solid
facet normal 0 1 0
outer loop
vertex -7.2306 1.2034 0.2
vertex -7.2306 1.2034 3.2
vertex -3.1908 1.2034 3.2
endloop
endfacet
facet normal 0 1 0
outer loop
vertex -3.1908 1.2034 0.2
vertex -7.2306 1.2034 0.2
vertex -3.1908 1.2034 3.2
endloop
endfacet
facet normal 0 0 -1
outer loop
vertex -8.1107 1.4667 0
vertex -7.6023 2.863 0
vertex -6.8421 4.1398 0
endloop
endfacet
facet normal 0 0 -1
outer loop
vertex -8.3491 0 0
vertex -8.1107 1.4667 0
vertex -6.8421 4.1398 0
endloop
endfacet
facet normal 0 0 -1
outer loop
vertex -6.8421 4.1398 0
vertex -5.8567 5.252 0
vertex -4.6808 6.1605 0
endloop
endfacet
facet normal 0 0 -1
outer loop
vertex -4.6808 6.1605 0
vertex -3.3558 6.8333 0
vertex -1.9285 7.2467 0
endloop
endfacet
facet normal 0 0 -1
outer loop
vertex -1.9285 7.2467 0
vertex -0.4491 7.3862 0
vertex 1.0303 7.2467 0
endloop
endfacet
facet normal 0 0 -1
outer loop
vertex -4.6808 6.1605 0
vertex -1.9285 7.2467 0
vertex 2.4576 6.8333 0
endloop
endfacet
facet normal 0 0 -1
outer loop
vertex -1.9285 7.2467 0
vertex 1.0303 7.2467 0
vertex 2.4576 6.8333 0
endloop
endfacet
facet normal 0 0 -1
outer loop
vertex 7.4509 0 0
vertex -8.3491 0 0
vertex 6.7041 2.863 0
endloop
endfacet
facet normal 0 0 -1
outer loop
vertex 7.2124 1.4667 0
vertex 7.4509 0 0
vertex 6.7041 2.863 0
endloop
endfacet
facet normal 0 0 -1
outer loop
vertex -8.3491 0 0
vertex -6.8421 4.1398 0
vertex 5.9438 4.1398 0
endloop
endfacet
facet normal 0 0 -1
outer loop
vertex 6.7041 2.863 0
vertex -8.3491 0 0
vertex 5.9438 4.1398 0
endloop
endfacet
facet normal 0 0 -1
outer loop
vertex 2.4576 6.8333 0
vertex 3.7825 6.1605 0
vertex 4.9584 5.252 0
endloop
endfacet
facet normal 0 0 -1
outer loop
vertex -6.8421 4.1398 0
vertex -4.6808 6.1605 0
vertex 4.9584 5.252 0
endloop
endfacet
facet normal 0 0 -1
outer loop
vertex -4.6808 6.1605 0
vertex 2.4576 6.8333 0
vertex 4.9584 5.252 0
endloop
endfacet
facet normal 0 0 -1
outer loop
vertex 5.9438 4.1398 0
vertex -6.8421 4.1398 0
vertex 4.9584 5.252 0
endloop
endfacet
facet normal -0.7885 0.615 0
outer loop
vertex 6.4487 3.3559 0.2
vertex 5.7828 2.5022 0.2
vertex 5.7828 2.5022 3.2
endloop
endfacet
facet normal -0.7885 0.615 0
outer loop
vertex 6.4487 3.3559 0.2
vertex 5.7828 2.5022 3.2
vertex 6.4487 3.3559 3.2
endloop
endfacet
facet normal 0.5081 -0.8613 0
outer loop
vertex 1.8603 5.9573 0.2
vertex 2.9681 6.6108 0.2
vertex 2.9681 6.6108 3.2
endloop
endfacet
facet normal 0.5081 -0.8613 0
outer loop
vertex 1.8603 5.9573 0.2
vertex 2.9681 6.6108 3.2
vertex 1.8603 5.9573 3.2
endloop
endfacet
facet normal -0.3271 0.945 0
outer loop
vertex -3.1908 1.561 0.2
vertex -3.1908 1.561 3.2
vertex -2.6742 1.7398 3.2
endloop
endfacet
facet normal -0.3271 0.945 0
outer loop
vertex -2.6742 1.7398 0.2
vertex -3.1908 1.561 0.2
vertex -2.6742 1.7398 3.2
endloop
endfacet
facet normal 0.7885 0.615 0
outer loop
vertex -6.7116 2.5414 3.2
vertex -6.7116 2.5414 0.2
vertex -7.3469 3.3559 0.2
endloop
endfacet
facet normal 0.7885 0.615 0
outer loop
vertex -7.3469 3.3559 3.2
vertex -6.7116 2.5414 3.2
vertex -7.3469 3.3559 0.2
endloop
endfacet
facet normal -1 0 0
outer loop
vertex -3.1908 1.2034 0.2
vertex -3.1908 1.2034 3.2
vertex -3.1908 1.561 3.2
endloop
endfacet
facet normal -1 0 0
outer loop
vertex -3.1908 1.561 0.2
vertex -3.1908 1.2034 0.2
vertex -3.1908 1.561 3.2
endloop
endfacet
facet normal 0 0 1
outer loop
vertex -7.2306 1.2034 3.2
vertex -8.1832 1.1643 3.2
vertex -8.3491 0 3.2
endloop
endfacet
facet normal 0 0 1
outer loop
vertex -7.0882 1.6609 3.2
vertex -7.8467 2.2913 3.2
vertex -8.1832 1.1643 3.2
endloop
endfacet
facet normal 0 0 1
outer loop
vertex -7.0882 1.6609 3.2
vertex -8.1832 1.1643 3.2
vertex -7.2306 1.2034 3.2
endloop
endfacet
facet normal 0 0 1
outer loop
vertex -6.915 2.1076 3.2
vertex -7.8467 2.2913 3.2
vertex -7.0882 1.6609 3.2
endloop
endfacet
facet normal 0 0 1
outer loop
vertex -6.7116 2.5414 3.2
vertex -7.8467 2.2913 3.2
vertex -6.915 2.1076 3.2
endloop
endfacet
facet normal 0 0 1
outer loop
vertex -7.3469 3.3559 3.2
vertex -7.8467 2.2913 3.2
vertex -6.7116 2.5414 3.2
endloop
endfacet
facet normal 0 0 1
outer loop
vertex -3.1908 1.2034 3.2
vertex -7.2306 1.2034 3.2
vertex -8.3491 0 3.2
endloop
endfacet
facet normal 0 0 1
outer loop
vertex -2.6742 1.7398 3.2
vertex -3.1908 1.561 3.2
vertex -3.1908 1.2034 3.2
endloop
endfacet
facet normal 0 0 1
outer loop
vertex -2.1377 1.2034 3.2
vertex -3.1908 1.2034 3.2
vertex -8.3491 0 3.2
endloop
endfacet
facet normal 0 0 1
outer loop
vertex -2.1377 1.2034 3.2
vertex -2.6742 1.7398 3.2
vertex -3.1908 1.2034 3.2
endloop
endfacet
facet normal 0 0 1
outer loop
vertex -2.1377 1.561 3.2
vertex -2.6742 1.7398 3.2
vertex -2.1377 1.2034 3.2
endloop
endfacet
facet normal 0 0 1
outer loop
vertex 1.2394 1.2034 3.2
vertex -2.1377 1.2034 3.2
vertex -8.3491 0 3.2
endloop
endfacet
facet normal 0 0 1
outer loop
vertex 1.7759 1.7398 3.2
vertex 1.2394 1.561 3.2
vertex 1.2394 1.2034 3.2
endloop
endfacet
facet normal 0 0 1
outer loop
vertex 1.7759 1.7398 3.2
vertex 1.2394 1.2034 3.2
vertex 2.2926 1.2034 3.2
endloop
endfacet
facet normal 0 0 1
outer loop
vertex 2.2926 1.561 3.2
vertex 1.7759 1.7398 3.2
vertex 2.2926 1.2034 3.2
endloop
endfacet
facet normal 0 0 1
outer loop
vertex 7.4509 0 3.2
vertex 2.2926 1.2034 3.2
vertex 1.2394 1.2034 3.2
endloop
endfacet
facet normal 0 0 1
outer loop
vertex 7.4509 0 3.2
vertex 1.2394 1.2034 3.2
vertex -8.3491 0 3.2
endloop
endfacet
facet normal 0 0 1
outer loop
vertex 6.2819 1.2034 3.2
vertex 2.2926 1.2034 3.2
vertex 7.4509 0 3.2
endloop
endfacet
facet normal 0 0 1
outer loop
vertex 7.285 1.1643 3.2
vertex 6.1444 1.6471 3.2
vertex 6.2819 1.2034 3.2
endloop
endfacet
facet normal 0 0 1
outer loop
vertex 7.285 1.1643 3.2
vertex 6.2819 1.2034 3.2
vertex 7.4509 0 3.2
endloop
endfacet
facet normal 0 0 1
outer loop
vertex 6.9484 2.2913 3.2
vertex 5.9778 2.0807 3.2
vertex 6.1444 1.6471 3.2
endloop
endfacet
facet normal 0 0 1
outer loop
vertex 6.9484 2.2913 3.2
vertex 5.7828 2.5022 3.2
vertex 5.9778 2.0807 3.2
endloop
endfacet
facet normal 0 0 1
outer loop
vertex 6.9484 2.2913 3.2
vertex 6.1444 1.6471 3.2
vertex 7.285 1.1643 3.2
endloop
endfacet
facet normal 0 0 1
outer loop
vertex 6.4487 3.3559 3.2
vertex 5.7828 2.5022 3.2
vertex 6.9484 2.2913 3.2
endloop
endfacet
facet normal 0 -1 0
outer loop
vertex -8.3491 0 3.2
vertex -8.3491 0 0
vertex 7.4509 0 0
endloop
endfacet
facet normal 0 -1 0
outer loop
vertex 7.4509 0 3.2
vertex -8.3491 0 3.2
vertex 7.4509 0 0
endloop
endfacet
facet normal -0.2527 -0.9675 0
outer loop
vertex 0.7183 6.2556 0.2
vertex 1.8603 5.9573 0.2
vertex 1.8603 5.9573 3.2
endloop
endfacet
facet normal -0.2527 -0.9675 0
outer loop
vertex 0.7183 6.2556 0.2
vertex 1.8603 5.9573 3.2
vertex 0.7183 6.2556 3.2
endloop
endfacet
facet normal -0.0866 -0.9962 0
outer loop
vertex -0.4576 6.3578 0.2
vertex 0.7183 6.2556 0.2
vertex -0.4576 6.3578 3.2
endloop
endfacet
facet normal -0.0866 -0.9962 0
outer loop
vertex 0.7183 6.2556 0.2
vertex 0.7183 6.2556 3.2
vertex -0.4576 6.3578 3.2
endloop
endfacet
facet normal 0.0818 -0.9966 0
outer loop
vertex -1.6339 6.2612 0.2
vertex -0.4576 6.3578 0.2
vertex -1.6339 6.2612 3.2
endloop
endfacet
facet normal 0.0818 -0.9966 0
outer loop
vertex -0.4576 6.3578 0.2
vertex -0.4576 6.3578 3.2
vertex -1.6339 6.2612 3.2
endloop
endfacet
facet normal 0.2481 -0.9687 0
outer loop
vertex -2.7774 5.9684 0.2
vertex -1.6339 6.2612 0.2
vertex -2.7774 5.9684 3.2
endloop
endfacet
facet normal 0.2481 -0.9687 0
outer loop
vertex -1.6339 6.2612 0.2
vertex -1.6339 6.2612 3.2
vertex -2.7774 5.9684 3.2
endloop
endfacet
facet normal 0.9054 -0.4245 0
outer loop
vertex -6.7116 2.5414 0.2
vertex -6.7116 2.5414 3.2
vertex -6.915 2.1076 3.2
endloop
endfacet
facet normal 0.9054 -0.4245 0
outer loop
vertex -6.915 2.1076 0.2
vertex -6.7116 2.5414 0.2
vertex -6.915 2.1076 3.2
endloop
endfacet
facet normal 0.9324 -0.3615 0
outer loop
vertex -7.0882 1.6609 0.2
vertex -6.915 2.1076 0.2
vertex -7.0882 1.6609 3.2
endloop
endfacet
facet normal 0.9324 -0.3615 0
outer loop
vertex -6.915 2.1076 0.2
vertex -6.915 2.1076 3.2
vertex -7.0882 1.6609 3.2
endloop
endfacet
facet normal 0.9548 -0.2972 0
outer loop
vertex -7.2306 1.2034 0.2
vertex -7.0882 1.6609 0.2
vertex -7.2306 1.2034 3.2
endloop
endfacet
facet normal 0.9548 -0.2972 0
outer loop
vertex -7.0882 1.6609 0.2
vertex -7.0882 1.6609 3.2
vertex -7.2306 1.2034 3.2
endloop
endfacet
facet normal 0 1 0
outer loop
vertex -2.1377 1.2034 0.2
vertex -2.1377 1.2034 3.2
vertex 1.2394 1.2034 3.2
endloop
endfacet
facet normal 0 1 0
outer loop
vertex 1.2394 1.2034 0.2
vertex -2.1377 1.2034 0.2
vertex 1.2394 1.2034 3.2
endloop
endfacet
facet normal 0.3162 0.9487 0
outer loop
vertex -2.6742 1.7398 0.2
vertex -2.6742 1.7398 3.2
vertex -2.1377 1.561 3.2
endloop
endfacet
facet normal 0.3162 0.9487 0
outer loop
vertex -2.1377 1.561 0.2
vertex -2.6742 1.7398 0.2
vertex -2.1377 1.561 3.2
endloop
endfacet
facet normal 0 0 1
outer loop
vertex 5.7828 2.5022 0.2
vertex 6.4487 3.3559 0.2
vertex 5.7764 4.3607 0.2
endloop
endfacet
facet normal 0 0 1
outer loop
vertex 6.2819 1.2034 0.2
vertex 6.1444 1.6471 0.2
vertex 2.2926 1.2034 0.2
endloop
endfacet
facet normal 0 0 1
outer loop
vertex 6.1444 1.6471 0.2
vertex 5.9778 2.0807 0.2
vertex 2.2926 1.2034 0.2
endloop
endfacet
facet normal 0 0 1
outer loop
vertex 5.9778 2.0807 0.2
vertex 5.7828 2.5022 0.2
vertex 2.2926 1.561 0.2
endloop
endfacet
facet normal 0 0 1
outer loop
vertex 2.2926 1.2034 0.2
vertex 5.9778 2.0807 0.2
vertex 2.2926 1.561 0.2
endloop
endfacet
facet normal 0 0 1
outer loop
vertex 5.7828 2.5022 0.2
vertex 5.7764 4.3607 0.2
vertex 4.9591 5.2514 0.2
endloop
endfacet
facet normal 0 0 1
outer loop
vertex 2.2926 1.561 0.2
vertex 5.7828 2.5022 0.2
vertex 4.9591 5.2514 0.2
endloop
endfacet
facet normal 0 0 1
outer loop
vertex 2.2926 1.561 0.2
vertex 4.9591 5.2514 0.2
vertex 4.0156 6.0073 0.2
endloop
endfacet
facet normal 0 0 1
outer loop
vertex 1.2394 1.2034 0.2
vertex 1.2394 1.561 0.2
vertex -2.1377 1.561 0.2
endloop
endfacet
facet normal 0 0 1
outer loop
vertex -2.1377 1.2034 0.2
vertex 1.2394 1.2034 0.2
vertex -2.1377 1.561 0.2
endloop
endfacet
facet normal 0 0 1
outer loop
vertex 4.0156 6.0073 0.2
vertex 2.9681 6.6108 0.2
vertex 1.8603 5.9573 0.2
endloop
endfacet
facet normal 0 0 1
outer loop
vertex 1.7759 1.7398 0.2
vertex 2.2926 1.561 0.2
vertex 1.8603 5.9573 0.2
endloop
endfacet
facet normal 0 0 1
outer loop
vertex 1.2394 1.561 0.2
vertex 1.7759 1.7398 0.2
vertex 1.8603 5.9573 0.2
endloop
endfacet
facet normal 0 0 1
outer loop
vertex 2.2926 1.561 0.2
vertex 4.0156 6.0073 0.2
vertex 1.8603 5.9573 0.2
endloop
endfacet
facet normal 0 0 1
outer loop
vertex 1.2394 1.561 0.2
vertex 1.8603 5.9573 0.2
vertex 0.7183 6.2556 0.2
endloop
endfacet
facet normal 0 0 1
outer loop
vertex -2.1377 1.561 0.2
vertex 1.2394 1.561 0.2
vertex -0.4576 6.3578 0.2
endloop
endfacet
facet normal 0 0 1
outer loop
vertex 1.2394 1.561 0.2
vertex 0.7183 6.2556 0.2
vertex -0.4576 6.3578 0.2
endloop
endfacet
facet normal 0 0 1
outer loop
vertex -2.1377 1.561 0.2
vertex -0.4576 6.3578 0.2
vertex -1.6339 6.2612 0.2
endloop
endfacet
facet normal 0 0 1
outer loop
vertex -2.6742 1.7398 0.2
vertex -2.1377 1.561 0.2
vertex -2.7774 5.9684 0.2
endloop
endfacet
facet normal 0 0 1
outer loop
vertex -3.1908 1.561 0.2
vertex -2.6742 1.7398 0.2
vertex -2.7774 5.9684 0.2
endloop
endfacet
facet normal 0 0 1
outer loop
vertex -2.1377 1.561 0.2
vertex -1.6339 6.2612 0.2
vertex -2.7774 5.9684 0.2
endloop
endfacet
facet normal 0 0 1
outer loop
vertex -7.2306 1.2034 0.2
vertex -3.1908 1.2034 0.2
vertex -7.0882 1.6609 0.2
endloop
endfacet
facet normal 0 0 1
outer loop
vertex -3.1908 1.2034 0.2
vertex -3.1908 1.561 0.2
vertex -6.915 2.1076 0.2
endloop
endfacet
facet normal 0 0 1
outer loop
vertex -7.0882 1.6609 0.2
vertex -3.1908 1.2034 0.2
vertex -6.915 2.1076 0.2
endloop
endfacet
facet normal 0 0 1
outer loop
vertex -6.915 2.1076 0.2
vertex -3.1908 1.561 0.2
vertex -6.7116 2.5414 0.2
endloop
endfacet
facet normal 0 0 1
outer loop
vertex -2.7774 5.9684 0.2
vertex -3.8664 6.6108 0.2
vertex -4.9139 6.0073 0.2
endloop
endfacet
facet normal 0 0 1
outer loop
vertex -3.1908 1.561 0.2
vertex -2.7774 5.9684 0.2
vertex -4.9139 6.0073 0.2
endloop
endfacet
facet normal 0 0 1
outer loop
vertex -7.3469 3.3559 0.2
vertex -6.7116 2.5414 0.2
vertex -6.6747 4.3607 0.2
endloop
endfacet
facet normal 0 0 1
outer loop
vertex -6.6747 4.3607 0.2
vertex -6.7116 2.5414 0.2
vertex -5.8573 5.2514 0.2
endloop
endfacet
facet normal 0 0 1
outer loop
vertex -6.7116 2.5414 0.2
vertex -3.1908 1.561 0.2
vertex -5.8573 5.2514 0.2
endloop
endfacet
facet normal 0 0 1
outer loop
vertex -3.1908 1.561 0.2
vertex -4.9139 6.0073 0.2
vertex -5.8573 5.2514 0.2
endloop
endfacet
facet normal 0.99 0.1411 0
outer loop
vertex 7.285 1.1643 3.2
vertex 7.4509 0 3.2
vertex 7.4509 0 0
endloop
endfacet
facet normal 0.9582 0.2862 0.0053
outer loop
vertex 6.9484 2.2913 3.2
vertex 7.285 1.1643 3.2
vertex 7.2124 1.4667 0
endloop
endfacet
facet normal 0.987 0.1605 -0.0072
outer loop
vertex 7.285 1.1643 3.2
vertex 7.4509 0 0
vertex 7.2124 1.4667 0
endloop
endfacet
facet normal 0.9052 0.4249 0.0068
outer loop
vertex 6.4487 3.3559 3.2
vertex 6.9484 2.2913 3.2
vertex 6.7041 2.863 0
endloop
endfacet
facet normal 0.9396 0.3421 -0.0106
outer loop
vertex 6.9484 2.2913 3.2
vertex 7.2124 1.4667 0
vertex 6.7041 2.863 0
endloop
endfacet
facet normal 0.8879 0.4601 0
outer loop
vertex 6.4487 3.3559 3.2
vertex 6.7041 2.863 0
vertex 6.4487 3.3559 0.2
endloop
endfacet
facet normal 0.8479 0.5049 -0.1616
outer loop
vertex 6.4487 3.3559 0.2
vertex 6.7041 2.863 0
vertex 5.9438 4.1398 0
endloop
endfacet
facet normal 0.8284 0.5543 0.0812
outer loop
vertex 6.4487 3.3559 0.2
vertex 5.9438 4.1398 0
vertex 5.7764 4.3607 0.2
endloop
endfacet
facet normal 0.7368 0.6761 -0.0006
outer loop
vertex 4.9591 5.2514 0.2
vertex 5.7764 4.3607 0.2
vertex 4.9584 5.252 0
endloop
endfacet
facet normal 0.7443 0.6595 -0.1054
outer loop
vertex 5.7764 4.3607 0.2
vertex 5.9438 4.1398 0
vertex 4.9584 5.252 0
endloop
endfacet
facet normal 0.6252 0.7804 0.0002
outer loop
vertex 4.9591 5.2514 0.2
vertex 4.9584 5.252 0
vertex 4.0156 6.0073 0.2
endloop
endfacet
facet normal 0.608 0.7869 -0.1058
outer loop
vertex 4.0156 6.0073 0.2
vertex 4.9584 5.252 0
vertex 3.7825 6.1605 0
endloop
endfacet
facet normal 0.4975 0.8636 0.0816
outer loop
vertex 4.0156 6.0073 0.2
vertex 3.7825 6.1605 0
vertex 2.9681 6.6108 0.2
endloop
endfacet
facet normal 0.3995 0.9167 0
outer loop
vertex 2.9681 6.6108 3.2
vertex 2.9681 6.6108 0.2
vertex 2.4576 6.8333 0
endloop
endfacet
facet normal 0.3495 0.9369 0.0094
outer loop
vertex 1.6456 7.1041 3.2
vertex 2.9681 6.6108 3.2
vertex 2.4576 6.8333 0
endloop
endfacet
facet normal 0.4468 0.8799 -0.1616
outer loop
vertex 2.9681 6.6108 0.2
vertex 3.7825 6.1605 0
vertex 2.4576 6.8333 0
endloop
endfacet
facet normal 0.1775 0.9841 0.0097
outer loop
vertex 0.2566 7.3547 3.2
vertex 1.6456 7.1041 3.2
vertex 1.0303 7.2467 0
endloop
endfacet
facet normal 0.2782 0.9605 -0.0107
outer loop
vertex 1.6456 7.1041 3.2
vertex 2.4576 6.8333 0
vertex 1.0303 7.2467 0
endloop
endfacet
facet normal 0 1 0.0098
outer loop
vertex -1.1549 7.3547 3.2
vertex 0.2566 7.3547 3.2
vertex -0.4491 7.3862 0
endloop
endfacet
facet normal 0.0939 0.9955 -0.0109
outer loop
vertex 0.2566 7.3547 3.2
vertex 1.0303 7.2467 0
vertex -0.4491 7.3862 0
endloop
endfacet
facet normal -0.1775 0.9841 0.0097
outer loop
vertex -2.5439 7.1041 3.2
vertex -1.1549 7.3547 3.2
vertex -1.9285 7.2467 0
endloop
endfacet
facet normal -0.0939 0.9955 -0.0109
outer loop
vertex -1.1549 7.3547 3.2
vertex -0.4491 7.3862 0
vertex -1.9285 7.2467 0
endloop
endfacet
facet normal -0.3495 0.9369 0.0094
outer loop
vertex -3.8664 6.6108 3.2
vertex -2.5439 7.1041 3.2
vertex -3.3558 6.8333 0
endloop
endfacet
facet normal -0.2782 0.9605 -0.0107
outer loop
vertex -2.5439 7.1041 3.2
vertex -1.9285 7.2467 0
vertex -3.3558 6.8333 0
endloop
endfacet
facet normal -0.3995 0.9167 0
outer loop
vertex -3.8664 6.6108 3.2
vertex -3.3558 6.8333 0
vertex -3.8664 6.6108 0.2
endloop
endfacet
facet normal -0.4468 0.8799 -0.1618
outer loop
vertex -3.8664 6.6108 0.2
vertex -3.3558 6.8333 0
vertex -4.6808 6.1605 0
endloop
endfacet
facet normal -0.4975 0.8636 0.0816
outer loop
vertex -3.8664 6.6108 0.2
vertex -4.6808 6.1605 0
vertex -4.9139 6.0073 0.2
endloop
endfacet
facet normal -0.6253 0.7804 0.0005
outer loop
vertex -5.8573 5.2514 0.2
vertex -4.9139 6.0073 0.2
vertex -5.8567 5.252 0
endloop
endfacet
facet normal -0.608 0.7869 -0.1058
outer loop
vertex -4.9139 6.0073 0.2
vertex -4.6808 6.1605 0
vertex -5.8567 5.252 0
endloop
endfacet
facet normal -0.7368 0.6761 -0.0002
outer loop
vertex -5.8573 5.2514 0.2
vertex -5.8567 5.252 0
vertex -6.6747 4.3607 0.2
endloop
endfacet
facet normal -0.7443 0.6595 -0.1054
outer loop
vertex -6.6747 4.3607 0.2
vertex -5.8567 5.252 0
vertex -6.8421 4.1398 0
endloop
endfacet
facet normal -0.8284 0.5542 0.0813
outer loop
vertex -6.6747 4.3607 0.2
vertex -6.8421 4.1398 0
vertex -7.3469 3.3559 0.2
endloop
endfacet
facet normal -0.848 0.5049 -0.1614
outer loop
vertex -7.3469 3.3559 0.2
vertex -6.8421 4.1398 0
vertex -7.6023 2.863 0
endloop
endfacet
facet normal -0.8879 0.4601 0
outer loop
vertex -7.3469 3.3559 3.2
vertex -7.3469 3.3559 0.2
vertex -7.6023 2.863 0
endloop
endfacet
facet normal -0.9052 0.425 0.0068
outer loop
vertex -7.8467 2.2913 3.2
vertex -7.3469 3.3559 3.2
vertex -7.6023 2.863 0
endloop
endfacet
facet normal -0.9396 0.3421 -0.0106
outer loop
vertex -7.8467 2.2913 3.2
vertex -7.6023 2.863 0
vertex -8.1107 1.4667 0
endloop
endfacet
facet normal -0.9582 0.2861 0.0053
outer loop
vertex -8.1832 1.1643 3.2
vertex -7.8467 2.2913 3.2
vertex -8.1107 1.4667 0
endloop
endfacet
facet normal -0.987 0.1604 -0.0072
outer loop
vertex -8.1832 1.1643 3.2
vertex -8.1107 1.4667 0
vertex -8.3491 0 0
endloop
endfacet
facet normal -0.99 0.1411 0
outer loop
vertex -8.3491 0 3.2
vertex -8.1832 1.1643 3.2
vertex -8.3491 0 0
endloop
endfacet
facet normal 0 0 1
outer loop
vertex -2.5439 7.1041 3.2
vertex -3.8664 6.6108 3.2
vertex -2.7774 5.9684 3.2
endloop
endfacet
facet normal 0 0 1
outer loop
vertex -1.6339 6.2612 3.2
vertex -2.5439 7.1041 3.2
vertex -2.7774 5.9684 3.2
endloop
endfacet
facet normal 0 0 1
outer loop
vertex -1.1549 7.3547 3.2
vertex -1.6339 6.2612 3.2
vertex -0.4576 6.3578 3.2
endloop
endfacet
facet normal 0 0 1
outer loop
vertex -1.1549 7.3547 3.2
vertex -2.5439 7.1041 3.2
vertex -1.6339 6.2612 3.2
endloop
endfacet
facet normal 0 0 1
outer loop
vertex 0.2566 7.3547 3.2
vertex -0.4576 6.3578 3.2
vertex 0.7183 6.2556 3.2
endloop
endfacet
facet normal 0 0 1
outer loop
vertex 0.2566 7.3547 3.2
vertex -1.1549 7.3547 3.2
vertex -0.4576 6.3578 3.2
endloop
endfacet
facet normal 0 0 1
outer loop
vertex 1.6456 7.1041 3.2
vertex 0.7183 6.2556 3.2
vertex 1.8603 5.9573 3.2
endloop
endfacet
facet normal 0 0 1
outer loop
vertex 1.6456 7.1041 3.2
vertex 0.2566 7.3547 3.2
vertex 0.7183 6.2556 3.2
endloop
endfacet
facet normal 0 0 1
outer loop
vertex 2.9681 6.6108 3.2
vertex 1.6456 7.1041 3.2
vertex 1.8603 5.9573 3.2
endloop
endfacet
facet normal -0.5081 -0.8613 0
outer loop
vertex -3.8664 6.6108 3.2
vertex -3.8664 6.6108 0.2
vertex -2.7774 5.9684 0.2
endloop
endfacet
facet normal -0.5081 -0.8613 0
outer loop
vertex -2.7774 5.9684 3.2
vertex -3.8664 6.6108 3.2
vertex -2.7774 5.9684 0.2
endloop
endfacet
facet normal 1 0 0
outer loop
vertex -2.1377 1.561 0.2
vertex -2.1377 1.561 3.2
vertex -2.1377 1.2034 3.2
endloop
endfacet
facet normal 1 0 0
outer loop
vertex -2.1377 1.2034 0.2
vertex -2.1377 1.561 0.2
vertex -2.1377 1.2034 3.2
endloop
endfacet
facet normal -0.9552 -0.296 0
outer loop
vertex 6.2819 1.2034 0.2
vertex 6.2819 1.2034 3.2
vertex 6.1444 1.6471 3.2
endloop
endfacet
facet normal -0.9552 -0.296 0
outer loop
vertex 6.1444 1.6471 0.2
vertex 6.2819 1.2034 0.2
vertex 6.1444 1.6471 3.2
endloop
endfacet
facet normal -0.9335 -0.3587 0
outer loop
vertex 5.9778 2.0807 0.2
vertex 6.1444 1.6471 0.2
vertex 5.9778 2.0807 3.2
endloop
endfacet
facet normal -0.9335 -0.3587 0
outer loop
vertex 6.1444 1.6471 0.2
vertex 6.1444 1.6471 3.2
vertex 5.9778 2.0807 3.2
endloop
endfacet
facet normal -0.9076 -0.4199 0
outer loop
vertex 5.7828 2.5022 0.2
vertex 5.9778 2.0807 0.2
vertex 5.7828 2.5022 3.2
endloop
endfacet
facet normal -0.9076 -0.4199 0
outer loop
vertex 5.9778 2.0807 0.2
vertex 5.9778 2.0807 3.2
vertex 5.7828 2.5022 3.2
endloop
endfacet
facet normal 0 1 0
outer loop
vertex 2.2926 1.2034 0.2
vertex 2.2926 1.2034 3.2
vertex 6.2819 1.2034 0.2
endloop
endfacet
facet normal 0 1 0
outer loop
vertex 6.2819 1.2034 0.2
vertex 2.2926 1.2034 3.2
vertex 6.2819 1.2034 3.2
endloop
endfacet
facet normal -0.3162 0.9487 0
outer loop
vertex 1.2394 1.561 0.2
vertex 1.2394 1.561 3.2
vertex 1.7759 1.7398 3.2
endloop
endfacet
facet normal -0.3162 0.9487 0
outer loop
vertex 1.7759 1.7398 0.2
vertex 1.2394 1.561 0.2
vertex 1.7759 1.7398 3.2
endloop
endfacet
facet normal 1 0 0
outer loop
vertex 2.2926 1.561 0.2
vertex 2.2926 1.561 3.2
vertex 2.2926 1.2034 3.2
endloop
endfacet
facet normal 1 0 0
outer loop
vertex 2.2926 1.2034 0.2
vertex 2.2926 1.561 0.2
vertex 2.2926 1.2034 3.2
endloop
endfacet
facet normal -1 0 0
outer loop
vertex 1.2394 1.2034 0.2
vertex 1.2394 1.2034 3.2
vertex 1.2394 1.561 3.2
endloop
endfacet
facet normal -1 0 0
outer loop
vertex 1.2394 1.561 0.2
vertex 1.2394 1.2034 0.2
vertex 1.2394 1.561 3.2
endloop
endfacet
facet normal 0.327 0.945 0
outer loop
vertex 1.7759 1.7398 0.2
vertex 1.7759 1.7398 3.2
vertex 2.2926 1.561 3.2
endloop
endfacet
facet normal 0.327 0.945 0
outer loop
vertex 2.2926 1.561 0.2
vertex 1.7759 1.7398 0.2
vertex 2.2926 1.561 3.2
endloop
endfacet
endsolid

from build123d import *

# Parameters (mm, degrees)
BOSS_EXTRUDE1_DEPTH = 3.2
CUT_EXTRUDE1_DEPTH  = 3
CUT_EXTRUDE2_START  = -3
CUT_EXTRUDE2_DEPTH  = 3


with BuildPart() as part:
    # Sketch1 → Boss-Extrude1 (new body)
    with BuildSketch(Plane.XY):
        with BuildLine():
            Line((-8.349125364, 0), (7.450874636, 0))
            ThreePointArc((7.450874636, 0), (-0.449125364, 7.386183646), (-8.349125364, 0))
        make_face()
    extrude(amount=BOSS_EXTRUDE1_DEPTH)

    # Sketch3 → Cut-Extrude1 (cut)
    with BuildSketch(Plane.XY.offset(3.2)):
        with BuildLine():
            Line((-3.19080338, 1.203425656), (-3.19080338, 1.560959579))
            Line((-3.19080338, 1.560959579), (-2.674178491, 1.739791271))
            Line((-2.674178491, 1.739791271), (-2.137683415, 1.560959579))
            Line((-2.137683415, 1.560959579), (-2.137683415, 1.203425656))
            Line((-2.137683415, 1.203425656), (1.239432686, 1.203425656))
            Line((1.239432686, 1.203425656), (1.239432686, 1.560959579))
            Line((1.239432686, 1.560959579), (1.775927763, 1.739791271))
            Line((1.775927763, 1.739791271), (2.292552651, 1.560959579))
            Line((2.292552651, 1.560959579), (2.292552651, 1.203425656))
            Line((2.292552651, 1.203425656), (6.281891371, 1.203425656))
            ThreePointArc((6.281891371, 1.203425656), (-0.47432937, 6.35784653), (-7.230550111, 1.203425656))
            Line((-7.230550111, 1.203425656), (-3.19080338, 1.203425656))
        make_face()
    extrude(amount=-CUT_EXTRUDE1_DEPTH, mode=Mode.SUBTRACT)

    # Sketch6 → Cut-Extrude2 (cut)
    with BuildSketch(Plane.XY.offset(3.2).offset(CUT_EXTRUDE2_START)):
        with BuildLine():
            Line((-3.866358844, 6.61080504), (-2.777388902, 5.968436276))
            ThreePointArc((-2.777388902, 5.968436276), (-5.071279367, 4.630051211), (-6.711633725, 2.54140437))
            Line((-6.711633725, 2.54140437), (-7.346913092, 3.355884027))
            ThreePointArc((-7.346913092, 3.355884027), (-5.857317606, 5.251403586), (-3.866358844, 6.61080504))
        make_face()
        with BuildLine():
            Line((5.778219706, 2.496322182), (6.448662363, 3.355884027))
            ThreePointArc((6.448662363, 3.355884027), (4.959066878, 5.251403586), (2.968108115, 6.61080504))
            Line((2.968108115, 6.61080504), (1.854961189, 5.954174597))
            ThreePointArc((1.854961189, 5.954174597), (4.155461155, 4.609729053), (5.778219706, 2.496322182))
        make_face()
    extrude(amount=CUT_EXTRUDE2_DEPTH, mode=Mode.SUBTRACT)


solid = part.part
